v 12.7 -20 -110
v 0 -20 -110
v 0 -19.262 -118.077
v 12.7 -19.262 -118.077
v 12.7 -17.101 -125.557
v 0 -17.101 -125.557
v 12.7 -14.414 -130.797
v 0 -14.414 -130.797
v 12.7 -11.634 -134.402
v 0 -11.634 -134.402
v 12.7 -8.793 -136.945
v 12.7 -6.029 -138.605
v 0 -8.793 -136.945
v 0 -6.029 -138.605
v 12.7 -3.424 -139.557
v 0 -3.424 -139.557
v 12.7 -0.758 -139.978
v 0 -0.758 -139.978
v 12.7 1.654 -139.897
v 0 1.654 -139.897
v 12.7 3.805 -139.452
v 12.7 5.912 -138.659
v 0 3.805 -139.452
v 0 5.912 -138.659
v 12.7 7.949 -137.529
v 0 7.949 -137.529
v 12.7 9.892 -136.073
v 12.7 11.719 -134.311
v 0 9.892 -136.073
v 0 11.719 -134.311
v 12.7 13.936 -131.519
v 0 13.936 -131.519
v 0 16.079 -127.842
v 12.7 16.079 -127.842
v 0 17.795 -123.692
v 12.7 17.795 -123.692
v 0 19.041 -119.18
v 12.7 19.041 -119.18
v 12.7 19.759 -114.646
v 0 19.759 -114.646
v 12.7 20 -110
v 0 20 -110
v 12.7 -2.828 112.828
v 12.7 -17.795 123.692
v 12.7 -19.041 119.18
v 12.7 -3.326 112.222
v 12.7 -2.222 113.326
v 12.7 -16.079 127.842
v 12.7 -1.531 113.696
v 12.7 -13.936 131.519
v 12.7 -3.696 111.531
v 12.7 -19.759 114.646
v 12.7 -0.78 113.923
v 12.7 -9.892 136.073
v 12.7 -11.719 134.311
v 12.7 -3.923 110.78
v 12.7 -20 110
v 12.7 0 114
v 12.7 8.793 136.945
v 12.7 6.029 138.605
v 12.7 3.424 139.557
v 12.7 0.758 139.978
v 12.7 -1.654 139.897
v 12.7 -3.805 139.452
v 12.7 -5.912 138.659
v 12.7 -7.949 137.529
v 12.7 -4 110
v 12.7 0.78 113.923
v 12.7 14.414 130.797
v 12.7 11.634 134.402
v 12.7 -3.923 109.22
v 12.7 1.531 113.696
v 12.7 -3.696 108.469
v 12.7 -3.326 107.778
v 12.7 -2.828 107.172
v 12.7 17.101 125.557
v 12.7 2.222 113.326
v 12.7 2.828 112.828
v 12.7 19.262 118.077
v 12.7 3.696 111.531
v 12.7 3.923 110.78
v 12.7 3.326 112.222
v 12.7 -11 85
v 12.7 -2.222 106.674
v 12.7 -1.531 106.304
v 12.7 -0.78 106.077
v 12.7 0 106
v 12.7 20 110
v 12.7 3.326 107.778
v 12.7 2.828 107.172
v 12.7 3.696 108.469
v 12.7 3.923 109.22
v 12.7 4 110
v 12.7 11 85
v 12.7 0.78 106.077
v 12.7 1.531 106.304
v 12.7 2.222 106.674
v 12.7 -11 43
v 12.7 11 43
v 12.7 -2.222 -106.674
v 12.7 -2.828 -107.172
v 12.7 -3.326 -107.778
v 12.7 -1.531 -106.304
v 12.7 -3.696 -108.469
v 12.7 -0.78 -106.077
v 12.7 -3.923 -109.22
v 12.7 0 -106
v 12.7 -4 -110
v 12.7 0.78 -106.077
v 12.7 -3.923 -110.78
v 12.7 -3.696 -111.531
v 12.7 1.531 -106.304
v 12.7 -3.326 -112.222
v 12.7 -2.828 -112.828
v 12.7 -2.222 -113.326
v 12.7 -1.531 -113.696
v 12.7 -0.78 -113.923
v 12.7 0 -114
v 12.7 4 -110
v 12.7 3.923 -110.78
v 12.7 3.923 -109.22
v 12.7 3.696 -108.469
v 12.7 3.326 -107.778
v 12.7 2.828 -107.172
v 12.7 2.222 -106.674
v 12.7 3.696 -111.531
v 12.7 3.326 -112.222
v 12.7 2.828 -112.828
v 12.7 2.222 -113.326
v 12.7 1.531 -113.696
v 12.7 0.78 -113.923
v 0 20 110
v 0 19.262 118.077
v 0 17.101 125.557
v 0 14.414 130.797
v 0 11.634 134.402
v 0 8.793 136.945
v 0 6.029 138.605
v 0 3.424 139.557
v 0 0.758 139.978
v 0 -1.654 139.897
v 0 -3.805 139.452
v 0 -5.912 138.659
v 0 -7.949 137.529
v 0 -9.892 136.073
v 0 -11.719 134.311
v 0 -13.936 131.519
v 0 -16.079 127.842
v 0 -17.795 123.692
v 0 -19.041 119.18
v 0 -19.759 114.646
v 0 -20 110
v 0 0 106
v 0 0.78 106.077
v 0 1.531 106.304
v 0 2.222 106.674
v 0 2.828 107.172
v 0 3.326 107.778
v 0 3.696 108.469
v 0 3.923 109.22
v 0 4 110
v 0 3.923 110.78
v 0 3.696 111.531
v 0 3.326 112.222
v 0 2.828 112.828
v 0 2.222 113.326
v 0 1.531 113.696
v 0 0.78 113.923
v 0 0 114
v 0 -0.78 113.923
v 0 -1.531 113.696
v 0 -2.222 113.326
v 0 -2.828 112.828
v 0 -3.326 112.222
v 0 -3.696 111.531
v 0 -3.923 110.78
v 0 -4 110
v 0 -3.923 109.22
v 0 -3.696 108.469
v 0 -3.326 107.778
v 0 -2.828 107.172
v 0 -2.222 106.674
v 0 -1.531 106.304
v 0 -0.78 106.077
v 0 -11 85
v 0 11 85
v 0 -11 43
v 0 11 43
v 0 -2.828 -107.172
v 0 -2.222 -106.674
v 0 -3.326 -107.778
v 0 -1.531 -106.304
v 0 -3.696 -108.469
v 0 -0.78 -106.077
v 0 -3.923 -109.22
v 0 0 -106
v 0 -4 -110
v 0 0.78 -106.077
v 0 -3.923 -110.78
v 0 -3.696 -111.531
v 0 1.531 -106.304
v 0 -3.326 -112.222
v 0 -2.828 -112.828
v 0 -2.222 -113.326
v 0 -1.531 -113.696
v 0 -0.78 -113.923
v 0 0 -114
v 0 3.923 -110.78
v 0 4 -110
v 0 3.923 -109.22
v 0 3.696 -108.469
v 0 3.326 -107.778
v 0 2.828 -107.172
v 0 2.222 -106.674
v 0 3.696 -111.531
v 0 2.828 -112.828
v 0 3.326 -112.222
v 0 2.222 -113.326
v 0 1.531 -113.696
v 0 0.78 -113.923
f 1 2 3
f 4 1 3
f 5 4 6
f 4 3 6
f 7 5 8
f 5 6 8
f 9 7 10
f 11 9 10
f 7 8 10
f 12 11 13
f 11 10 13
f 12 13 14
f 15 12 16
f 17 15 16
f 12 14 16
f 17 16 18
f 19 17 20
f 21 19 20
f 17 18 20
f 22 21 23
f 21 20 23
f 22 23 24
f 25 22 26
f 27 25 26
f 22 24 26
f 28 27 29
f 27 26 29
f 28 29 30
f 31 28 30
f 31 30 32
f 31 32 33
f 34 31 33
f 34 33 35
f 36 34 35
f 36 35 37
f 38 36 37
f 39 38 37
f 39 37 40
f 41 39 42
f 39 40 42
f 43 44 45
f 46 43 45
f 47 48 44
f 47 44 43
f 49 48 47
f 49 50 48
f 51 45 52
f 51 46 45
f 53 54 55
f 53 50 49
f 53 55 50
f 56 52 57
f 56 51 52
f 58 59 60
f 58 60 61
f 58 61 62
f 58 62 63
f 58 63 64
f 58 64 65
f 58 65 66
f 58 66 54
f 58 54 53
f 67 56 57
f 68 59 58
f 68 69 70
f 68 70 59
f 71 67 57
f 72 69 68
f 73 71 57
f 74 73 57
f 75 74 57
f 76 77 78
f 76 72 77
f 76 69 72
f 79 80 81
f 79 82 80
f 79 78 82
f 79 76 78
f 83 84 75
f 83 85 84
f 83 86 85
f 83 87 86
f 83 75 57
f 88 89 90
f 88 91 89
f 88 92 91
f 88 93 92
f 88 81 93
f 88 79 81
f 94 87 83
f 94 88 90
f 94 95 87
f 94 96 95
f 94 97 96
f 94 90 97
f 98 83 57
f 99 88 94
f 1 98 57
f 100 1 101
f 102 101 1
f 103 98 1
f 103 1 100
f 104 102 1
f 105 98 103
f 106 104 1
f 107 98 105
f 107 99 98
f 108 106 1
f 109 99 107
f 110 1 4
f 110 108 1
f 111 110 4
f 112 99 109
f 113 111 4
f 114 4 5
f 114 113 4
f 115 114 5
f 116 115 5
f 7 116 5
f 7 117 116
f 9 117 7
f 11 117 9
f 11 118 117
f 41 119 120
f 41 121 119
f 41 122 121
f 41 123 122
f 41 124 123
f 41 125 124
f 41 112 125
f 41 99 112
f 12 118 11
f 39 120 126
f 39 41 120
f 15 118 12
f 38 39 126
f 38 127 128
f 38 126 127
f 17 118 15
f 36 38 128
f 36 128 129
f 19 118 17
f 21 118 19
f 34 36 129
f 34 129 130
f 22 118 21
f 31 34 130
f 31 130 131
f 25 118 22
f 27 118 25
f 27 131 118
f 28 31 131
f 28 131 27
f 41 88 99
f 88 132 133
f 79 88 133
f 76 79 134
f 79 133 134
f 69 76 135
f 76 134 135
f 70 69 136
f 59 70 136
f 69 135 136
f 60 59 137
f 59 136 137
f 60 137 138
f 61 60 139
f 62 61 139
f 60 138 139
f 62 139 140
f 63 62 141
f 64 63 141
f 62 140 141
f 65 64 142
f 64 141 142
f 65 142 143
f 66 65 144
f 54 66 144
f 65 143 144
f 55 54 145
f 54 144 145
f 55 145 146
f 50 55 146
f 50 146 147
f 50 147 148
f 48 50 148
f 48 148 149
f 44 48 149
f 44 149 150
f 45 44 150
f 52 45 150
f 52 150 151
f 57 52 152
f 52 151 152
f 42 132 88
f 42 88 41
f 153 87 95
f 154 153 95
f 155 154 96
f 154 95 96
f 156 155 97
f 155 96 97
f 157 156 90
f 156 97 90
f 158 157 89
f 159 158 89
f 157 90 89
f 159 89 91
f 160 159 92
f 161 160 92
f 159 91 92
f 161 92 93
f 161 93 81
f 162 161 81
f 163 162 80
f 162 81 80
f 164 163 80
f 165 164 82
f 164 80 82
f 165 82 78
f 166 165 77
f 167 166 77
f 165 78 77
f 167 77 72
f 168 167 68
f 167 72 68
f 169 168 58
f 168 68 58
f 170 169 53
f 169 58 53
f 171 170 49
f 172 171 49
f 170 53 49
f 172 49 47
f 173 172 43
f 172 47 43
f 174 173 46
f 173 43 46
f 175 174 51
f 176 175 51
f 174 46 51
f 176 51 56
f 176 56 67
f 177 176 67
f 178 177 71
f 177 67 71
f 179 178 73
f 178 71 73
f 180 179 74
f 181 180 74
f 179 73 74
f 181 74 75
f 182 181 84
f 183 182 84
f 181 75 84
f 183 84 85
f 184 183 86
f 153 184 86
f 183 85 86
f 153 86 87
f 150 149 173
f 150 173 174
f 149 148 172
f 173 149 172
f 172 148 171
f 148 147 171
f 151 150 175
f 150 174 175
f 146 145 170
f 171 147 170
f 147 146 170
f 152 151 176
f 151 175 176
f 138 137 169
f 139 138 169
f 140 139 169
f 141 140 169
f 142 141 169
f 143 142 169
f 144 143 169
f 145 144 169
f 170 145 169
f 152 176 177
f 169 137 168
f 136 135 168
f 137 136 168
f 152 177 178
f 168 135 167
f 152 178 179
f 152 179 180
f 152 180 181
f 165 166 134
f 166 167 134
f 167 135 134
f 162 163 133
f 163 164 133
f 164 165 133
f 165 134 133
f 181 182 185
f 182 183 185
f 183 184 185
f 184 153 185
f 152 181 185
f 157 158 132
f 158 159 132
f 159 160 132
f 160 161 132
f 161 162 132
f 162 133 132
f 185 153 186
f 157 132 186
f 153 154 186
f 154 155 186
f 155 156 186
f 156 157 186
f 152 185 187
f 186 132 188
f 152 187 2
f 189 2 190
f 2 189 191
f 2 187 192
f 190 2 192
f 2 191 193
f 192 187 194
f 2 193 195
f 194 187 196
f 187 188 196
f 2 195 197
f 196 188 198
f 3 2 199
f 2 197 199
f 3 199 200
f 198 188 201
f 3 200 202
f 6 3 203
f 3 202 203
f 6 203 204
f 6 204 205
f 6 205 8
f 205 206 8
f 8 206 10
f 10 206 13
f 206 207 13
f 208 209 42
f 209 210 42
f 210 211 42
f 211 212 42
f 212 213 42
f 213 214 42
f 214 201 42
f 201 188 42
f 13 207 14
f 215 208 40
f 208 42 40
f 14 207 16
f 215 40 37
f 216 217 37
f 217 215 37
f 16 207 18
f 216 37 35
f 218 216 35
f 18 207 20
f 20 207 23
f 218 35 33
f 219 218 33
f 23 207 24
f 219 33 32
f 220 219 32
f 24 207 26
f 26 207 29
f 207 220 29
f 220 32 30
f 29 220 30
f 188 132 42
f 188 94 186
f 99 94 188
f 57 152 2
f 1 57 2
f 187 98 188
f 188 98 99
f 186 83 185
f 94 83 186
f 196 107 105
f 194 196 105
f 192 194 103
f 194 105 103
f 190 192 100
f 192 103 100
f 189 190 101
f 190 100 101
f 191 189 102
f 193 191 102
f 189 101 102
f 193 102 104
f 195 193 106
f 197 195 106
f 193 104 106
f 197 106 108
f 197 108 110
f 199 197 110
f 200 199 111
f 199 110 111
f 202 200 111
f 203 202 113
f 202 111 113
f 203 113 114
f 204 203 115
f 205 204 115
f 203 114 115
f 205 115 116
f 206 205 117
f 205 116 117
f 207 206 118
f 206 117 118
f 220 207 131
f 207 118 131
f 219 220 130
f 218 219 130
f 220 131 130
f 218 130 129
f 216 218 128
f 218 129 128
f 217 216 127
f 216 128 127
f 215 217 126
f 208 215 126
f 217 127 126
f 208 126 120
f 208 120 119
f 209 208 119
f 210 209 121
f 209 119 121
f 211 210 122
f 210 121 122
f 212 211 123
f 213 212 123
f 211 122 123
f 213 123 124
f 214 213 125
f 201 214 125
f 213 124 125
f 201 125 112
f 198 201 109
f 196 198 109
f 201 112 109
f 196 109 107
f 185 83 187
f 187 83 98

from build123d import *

# Parameters (mm, degrees)
SKETCH1_RX          = 30
SKETCH1_RY          = 20
SKETCH1_W           = 220
SKETCH1_H           = 40
BOSS_EXTRUDE1_DEPTH = 12.7
SKETCH2_R           = 4
SKETCH2_W           = 42
SKETCH2_H           = 22
CUT_EXTRUDE1_DEPTH  = 12.7


with BuildPart() as part:
    # Sketch1 → Boss-Extrude1 (new body)
    with BuildSketch(Plane(origin=(0, 0, 0), x_dir=(0, 0, -1), z_dir=(1, 0, 0))):
        with Locations(Location((-110, 0), (0, 0, 0))):
            Ellipse(SKETCH1_RX, SKETCH1_RY)
        with Locations(Location((110, 0), (0, 0, -180))):
            Ellipse(SKETCH1_RX, SKETCH1_RY)
        Rectangle(SKETCH1_W, SKETCH1_H)
    extrude(amount=BOSS_EXTRUDE1_DEPTH)

    # Sketch2 → Cut-Extrude1 (cut)
    with BuildSketch(Plane(origin=(12.7, 0, 0), x_dir=(0, 0, -1), z_dir=(1, 0, 0))):
        with Locations((-110, 0)):
            Circle(SKETCH2_R)
        with Locations(Location((110, 0, 0), (0, 0, 180))):
            Circle(SKETCH2_R)
        with Locations((-64, 0)):
            Rectangle(SKETCH2_W, SKETCH2_H)
    extrude(amount=-CUT_EXTRUDE1_DEPTH, mode=Mode.SUBTRACT)


solid = part.part
